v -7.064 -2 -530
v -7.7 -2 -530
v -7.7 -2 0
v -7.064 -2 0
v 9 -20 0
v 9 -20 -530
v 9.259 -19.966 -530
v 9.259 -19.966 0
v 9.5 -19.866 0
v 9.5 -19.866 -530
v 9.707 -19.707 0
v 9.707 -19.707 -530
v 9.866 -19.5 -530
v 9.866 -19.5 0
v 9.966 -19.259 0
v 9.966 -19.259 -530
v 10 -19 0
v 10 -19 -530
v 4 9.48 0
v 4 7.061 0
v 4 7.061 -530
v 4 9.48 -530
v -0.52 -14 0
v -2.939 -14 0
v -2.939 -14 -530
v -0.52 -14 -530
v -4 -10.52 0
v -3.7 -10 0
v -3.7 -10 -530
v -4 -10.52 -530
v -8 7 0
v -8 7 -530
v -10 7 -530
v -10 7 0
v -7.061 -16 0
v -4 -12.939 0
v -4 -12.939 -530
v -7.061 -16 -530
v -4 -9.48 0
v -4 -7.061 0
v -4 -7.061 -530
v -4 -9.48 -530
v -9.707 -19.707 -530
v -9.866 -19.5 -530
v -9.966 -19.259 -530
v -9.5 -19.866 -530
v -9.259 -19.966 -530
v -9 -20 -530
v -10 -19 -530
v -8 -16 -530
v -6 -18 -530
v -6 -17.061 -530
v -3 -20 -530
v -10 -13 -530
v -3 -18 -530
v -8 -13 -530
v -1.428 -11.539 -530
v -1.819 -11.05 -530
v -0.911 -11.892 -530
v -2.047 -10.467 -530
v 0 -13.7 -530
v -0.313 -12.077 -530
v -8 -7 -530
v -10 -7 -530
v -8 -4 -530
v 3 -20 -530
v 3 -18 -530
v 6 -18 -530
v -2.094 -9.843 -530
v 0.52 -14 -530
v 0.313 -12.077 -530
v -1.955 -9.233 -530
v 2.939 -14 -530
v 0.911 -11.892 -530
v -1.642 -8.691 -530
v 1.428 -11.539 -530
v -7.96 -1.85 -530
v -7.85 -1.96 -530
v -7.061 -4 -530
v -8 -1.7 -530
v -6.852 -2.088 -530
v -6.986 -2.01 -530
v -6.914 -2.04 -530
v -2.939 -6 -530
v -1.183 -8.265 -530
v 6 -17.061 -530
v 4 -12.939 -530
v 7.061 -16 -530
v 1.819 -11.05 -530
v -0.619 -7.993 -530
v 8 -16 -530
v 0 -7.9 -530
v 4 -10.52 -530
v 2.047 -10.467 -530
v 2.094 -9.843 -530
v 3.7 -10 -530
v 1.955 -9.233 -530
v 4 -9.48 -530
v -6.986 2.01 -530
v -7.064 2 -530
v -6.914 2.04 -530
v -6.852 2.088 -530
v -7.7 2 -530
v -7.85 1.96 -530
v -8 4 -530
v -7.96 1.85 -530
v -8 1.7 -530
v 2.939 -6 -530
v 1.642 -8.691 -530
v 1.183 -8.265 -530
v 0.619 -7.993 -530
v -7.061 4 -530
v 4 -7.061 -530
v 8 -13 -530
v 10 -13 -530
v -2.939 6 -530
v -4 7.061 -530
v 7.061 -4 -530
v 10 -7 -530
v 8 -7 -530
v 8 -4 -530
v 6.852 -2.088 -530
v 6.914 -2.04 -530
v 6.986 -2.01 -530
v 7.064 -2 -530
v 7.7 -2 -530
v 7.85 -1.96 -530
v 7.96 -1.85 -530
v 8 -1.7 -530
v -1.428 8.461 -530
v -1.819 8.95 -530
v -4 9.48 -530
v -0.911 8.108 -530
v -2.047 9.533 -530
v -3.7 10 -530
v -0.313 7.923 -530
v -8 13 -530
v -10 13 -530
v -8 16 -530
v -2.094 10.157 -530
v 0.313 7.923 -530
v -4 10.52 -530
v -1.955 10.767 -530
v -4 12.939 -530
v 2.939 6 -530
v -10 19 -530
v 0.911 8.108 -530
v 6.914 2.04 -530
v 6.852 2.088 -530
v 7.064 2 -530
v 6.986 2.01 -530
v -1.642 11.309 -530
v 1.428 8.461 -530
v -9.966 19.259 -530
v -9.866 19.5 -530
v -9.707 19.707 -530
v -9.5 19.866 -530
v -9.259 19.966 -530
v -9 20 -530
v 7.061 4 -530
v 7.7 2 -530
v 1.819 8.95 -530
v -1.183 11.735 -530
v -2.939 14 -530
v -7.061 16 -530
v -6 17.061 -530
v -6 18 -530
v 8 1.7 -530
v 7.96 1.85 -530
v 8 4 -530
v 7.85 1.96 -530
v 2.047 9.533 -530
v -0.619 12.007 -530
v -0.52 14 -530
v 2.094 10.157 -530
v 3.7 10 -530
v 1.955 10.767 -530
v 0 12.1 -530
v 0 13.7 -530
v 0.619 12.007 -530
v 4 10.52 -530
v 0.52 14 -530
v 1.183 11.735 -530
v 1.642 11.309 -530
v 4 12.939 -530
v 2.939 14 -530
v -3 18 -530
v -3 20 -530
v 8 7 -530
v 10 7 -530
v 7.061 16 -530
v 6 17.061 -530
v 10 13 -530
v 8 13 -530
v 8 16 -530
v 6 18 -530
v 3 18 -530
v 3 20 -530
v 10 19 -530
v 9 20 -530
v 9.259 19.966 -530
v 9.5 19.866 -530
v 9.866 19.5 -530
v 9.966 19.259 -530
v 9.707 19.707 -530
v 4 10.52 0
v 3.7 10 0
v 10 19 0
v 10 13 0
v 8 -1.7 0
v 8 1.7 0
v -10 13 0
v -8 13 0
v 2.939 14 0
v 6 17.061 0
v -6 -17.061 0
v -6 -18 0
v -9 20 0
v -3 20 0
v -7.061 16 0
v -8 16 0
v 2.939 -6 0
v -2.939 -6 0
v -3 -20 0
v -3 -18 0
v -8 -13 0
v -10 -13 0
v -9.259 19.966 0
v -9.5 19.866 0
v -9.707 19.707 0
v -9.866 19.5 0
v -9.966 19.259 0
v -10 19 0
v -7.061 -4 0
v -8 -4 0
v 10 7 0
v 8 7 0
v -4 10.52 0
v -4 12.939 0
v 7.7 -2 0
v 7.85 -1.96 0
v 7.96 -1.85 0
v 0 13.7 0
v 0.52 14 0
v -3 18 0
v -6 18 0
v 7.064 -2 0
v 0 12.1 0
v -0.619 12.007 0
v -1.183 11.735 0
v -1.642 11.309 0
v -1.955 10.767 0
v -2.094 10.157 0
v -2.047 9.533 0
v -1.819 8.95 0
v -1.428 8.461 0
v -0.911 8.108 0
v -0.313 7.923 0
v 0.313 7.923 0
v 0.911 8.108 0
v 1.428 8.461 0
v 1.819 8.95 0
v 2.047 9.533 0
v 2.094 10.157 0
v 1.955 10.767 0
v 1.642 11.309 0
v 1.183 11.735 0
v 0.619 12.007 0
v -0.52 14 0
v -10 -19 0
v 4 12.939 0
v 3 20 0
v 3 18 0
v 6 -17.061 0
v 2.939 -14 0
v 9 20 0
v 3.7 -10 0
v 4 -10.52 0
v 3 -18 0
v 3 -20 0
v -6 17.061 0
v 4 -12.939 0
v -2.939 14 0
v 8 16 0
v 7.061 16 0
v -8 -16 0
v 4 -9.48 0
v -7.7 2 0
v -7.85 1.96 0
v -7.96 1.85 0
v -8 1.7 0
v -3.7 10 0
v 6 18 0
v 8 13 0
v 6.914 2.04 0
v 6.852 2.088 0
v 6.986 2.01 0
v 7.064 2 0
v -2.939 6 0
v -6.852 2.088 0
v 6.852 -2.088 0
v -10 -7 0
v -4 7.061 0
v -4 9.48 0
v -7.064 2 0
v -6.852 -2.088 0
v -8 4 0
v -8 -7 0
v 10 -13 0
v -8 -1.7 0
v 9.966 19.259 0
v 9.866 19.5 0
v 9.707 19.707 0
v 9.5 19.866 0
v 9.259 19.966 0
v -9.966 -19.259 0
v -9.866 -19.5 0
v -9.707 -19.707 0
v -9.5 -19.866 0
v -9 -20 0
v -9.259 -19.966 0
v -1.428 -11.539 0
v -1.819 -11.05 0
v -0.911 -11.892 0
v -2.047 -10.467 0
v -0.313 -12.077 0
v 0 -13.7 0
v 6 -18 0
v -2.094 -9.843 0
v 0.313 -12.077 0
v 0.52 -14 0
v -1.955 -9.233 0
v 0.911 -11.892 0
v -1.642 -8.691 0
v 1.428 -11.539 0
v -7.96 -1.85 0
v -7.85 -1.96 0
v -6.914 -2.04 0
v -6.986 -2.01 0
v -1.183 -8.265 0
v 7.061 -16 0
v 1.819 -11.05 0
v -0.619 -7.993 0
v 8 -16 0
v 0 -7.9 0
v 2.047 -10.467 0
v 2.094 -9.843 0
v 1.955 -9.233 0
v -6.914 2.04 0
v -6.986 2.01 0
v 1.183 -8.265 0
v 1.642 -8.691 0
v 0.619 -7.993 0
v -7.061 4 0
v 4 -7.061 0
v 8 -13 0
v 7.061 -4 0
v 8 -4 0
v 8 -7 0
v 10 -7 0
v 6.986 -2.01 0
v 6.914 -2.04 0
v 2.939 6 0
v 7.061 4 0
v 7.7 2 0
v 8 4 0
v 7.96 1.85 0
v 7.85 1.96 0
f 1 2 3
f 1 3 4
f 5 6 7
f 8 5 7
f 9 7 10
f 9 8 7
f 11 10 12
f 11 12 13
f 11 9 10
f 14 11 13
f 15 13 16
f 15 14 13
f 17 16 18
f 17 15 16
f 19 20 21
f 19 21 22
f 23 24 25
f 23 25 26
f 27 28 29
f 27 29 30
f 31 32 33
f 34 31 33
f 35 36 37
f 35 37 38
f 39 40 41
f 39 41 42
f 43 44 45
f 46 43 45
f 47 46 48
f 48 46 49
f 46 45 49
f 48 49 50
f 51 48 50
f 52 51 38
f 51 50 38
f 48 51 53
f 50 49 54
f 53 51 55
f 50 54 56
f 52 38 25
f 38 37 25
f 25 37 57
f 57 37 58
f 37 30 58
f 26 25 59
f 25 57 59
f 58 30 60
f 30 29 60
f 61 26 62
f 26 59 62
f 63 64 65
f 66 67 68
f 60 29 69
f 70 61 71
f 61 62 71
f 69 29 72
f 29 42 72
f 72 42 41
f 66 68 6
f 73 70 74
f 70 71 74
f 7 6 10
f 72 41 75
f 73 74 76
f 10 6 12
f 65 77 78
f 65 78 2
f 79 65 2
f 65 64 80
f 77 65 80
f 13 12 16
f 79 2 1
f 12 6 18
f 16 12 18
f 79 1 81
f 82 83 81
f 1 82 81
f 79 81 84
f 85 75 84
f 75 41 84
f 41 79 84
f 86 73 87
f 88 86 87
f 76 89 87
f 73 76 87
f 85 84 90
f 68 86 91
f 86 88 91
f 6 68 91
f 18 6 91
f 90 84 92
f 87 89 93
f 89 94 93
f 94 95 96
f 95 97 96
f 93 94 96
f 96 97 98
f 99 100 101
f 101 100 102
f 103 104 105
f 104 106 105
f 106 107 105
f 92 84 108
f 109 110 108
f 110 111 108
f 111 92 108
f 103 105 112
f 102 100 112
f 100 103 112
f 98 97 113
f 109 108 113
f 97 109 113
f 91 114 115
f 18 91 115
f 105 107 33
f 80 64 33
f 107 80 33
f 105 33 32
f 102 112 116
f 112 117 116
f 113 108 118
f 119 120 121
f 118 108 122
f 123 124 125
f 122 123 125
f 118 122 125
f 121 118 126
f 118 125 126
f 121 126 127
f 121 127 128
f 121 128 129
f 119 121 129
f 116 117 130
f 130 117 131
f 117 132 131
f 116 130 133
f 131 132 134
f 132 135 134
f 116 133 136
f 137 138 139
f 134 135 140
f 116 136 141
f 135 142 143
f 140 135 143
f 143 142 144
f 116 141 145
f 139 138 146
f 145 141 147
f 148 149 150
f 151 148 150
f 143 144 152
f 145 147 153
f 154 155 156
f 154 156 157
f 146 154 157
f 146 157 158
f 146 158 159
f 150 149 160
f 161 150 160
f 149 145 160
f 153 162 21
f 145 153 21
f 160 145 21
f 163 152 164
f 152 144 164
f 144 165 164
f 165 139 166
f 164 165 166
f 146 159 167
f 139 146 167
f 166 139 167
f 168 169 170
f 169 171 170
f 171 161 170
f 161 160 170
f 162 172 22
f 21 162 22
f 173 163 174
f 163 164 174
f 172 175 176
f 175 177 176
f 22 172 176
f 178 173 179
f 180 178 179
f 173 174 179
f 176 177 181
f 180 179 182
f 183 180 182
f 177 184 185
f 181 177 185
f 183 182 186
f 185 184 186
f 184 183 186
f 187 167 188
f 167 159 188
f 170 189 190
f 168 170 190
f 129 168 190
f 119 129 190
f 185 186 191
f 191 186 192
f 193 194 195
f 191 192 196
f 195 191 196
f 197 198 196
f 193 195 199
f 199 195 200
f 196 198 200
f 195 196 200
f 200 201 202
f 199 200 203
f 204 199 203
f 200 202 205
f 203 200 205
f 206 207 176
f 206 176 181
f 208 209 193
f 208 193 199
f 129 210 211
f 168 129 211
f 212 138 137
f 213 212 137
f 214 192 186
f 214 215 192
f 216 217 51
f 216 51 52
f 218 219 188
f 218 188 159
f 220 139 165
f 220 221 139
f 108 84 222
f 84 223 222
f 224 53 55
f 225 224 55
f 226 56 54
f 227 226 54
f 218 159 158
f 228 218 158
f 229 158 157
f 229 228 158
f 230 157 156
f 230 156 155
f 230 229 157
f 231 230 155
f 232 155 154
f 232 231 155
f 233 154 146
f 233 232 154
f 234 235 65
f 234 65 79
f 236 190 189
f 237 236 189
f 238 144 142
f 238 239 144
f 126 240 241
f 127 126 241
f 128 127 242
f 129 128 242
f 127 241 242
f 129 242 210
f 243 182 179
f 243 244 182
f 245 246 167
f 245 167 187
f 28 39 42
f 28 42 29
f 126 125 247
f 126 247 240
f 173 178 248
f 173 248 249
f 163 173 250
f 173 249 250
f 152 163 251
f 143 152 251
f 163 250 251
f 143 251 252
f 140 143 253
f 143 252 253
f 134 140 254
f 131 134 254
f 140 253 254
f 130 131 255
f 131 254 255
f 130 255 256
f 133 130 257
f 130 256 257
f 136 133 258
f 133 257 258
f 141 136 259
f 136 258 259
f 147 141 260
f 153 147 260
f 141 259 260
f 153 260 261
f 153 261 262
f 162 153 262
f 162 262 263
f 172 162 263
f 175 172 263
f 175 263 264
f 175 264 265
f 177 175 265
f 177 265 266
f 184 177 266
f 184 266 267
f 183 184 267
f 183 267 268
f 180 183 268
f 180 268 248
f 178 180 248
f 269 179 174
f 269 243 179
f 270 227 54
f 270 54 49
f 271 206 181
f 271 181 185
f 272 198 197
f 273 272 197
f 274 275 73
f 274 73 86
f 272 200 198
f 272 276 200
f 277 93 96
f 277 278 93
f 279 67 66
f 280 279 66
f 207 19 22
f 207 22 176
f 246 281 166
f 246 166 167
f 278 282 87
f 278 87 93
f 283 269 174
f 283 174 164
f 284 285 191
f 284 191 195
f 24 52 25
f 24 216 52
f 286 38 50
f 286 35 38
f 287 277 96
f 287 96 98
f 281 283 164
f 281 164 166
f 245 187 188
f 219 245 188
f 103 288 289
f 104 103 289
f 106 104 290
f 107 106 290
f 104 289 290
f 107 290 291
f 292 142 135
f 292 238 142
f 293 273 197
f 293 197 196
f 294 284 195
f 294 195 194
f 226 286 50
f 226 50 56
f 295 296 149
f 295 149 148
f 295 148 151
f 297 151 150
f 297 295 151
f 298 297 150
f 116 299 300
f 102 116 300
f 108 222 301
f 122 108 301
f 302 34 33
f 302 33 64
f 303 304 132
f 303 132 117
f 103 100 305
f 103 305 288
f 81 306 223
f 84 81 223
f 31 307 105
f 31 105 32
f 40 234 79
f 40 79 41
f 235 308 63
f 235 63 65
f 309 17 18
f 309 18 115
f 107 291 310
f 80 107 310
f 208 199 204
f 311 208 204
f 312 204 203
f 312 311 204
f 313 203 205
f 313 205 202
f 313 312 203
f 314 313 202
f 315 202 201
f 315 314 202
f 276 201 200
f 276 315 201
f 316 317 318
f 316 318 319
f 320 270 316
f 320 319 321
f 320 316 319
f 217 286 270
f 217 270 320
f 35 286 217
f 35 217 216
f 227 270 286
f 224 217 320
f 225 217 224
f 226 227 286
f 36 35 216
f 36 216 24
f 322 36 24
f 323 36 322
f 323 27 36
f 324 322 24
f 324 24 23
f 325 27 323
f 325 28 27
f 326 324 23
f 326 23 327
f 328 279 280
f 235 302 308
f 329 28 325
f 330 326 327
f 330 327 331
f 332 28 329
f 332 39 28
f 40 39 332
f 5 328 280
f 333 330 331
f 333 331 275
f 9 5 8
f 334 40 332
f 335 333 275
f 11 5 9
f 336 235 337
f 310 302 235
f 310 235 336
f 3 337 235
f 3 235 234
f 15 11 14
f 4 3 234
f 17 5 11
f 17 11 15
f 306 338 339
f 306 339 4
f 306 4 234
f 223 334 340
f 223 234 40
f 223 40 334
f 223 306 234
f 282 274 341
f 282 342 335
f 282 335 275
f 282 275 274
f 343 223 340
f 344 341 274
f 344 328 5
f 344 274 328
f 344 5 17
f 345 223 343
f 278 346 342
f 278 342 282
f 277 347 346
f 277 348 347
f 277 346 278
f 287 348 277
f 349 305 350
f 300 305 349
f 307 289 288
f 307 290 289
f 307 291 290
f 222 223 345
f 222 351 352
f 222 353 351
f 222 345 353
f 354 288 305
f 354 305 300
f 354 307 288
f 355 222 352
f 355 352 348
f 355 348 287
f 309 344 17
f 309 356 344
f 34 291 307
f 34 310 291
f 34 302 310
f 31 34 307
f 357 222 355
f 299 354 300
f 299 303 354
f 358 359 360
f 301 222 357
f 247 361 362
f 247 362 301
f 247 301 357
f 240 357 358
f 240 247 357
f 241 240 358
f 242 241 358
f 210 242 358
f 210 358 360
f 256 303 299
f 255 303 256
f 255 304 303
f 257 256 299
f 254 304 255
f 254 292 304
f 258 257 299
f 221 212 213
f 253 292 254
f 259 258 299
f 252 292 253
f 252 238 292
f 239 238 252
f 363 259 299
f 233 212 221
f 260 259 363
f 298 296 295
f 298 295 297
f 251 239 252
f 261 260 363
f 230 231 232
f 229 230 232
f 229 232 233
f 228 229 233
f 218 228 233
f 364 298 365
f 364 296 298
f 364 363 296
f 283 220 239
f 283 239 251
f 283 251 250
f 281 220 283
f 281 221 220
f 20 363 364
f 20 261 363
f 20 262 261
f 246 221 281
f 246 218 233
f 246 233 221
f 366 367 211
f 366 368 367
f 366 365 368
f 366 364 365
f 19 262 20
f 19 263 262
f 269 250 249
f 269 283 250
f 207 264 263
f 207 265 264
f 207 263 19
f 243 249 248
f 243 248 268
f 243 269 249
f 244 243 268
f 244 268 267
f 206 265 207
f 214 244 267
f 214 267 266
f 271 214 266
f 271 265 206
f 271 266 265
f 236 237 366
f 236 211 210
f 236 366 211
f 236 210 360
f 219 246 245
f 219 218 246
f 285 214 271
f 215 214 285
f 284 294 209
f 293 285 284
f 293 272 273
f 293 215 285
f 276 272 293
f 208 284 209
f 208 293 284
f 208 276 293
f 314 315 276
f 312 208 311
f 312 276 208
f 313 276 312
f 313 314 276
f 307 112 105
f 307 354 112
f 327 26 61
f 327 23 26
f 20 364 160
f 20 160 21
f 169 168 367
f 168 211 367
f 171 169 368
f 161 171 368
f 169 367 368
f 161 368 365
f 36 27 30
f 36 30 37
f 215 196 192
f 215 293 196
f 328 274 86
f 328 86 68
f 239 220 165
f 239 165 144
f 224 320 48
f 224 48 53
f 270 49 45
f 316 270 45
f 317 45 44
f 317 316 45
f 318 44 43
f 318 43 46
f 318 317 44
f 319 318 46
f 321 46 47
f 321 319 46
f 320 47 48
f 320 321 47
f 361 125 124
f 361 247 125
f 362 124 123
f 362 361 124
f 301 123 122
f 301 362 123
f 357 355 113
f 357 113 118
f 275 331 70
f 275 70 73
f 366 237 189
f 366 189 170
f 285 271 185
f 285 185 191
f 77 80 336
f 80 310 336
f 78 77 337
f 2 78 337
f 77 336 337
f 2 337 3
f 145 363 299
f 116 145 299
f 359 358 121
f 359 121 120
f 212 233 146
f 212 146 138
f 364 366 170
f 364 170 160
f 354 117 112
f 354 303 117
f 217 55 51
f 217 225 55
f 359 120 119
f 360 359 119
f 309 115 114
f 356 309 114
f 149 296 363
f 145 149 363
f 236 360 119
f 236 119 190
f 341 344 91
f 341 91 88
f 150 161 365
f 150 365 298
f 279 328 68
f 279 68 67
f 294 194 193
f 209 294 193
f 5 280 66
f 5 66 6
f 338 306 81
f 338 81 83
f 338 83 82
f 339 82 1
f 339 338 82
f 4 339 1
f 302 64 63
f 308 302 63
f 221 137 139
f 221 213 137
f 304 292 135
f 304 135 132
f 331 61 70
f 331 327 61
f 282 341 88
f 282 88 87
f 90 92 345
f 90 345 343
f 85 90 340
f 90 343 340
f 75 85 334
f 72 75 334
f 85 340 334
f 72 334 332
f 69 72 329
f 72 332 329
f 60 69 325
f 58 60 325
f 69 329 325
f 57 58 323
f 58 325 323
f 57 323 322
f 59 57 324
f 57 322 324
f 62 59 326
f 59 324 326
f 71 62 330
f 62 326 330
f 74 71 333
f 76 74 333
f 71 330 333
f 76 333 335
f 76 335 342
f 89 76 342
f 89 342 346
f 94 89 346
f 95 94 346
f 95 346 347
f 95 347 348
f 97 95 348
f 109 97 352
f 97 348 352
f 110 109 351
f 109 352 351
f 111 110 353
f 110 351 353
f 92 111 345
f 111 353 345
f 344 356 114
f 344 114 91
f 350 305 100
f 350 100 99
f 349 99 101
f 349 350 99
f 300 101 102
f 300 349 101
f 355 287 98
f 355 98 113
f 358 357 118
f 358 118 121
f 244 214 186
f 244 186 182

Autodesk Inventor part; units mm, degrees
sketch "Sketch_1" plane through (0, 0, 0) normal (0, 0, 1) x (1, 0, 0)
  line L0 (-10, -7) -> (-8, -7)
  line L1 (-8, -7) -> (-8, -4)
  line L2 (-8, -4) -> (-7.0607, -4)
  line L3 (-7.0607, -4) -> (-4, -7.0607)
  line L4 (-4, -7.0607) -> (-4, -9.4804)
  line L5 (-4, -9.4804) -> (-3.7, -10)
  line L6 (-3.7, -10) -> (-4, -10.5196)
  line L7 (-4, -10.5196) -> (-4, -12.9393)
  line L8 (-4, -12.9393) -> (-7.0607, -16)
  line L9 (-7.0607, -16) -> (-8, -16)
  line L10 (-8, -16) -> (-8, -13)
  line L11 (-8, -13) -> (-10, -13)
  line L12 (-10, -13) -> (-10, -19)
  arc A0 (-10, -19) -> (-9, -20) centre (-9, -19) ccw
  line L13 (-9, -20) -> (-3, -20)
  line L14 (-3, -20) -> (-3, -18)
  line L15 (-3, -18) -> (-6, -18)
  line L16 (-6, -18) -> (-6, -17.0607)
  line L17 (-6, -17.0607) -> (-2.9393, -14)
  line L18 (-2.9393, -14) -> (-0.5196, -14)
  line L19 (-0.5196, -14) -> (0, -13.7)
  line L20 (0, -13.7) -> (0.5196, -14)
  line L21 (0.5196, -14) -> (2.9393, -14)
  line L22 (2.9393, -14) -> (6, -17.0607)
  line L23 (6, -17.0607) -> (6, -18)
  line L24 (6, -18) -> (3, -18)
  line L25 (3, -18) -> (3, -20)
  line L26 (3, -20) -> (9, -20)
  arc A1 (9, -20) -> (10, -19) centre (9, -19) ccw
  line L27 (10, -19) -> (10, -13)
  line L28 (10, -13) -> (8, -13)
  line L29 (8, -13) -> (8, -16)
  line L30 (8, -16) -> (7.0607, -16)
  line L31 (7.0607, -16) -> (4, -12.9393)
  line L32 (4, -12.9393) -> (4, -10.5196)
  line L33 (4, -10.5196) -> (3.7, -10)
  line L34 (3.7, -10) -> (4, -9.4804)
  line L35 (4, -9.4804) -> (4, -7.0607)
  line L36 (4, -7.0607) -> (7.0607, -4)
  line L37 (7.0607, -4) -> (8, -4)
  line L38 (8, -4) -> (8, -7)
  line L39 (8, -7) -> (10, -7)
  line L40 (10, -7) -> (10, 7)
  line L41 (10, 7) -> (8, 7)
  line L42 (8, 7) -> (8, 4)
  line L43 (8, 4) -> (7.0607, 4)
  line L44 (7.0607, 4) -> (4, 7.0607)
  line L45 (4, 7.0607) -> (4, 9.4804)
  line L46 (4, 9.4804) -> (3.7, 10)
  line L47 (3.7, 10) -> (4, 10.5196)
  line L48 (4, 10.5196) -> (4, 12.9393)
  line L49 (4, 12.9393) -> (7.0607, 16)
  line L50 (7.0607, 16) -> (8, 16)
  line L51 (8, 16) -> (8, 13)
  line L52 (8, 13) -> (10, 13)
  line L53 (10, 13) -> (10, 19)
  arc A2 (10, 19) -> (9, 20) centre (9, 19) ccw
  line L54 (9, 20) -> (3, 20)
  line L55 (3, 20) -> (3, 18)
  line L56 (3, 18) -> (6, 18)
  line L57 (6, 18) -> (6, 17.0607)
  line L58 (6, 17.0607) -> (2.9393, 14)
  line L59 (2.9393, 14) -> (0.5196, 14)
  line L60 (0.5196, 14) -> (0, 13.7)
  line L61 (0, 13.7) -> (-0.5196, 14)
  line L62 (-0.5196, 14) -> (-2.9393, 14)
  line L63 (-2.9393, 14) -> (-6, 17.0607)
  line L64 (-6, 17.0607) -> (-6, 18)
  line L65 (-6, 18) -> (-3, 18)
  line L66 (-3, 18) -> (-3, 20)
  line L67 (-3, 20) -> (-9, 20)
  arc A3 (-9, 20) -> (-10, 19) centre (-9, 19) ccw
  line L68 (-10, 19) -> (-10, 13)
  line L69 (-10, 13) -> (-8, 13)
  line L70 (-8, 13) -> (-8, 16)
  line L71 (-8, 16) -> (-7.0607, 16)
  line L72 (-7.0607, 16) -> (-4, 12.9393)
  line L73 (-4, 12.9393) -> (-4, 10.5196)
  line L74 (-4, 10.5196) -> (-3.7, 10)
  line L75 (-3.7, 10) -> (-4, 9.4804)
  line L76 (-4, 9.4804) -> (-4, 7.0607)
  line L77 (-4, 7.0607) -> (-7.0607, 4)
  line L78 (-7.0607, 4) -> (-8, 4)
  line L79 (-8, 4) -> (-8, 7)
  line L80 (-8, 7) -> (-10, 7)
  line L81 (-10, 7) -> (-10, -7)
  line L82 (-8, 1.7) -> (-8, -1.7)
  arc A4 (-8, -1.7) -> (-7.7, -2) centre (-7.7, -1.7) ccw
  line L83 (-7.7, -2) -> (-7.0636, -2)
  arc A5 (-6.8515, -2.0879) -> (-7.0636, -2) centre (-7.0636, -2.3) ccw
  line L84 (-6.8515, -2.0879) -> (-2.9393, -6)
  line L85 (-2.9393, -6) -> (2.9393, -6)
  line L86 (2.9393, -6) -> (6.8515, -2.0879)
  arc A6 (7.0636, -2) -> (6.8515, -2.0879) centre (7.0636, -2.3) ccw
  line L87 (7.0636, -2) -> (7.7, -2)
  arc A7 (7.7, -2) -> (8, -1.7) centre (7.7, -1.7) ccw
  line L88 (8, -1.7) -> (8, 1.7)
  arc A8 (8, 1.7) -> (7.7, 2) centre (7.7, 1.7) ccw
  line L89 (7.7, 2) -> (7.0636, 2)
  arc A9 (6.8515, 2.0879) -> (7.0636, 2) centre (7.0636, 2.3) ccw
  line L90 (6.8515, 2.0879) -> (2.9393, 6)
  line L91 (2.9393, 6) -> (-2.9393, 6)
  line L92 (-2.9393, 6) -> (-6.8515, 2.0879)
  arc A10 (-7.0636, 2) -> (-6.8515, 2.0879) centre (-7.0636, 2.3) ccw
  line L93 (-7.0636, 2) -> (-7.7, 2)
  arc A11 (-7.7, 2) -> (-8, 1.7) centre (-7.7, 1.7) ccw
extrude "Extrusion1" add sketch "Sketch_1" against normal blind 530
sketch "Sketch2" plane through (0, 0, -530) normal (0, 0, -1) x (-1, 0, 0)
  point P0 (0, 10)
hole "Hole1" at (0, 10, -530) direction (0, 0, 1) diameter 4.2 depth 530
pattern_linear "Rectangular Pattern1" count 2 spacing 20 along (0, -1, 0) of "Hole1"
ref_plane "C1_XY" through (0, 0, 0) normal (0, 0, 1) x (1, 0, 0)
ref_plane "C1_YZ" through (0, 0, 0) normal (1, 0, 0) x (0, 1, 0)
ref_plane "C1_ZX" through (0, 0, 0) normal (0, 1, 0) x (0, 0, 1)
properties part number "HFS5-2040-530"
